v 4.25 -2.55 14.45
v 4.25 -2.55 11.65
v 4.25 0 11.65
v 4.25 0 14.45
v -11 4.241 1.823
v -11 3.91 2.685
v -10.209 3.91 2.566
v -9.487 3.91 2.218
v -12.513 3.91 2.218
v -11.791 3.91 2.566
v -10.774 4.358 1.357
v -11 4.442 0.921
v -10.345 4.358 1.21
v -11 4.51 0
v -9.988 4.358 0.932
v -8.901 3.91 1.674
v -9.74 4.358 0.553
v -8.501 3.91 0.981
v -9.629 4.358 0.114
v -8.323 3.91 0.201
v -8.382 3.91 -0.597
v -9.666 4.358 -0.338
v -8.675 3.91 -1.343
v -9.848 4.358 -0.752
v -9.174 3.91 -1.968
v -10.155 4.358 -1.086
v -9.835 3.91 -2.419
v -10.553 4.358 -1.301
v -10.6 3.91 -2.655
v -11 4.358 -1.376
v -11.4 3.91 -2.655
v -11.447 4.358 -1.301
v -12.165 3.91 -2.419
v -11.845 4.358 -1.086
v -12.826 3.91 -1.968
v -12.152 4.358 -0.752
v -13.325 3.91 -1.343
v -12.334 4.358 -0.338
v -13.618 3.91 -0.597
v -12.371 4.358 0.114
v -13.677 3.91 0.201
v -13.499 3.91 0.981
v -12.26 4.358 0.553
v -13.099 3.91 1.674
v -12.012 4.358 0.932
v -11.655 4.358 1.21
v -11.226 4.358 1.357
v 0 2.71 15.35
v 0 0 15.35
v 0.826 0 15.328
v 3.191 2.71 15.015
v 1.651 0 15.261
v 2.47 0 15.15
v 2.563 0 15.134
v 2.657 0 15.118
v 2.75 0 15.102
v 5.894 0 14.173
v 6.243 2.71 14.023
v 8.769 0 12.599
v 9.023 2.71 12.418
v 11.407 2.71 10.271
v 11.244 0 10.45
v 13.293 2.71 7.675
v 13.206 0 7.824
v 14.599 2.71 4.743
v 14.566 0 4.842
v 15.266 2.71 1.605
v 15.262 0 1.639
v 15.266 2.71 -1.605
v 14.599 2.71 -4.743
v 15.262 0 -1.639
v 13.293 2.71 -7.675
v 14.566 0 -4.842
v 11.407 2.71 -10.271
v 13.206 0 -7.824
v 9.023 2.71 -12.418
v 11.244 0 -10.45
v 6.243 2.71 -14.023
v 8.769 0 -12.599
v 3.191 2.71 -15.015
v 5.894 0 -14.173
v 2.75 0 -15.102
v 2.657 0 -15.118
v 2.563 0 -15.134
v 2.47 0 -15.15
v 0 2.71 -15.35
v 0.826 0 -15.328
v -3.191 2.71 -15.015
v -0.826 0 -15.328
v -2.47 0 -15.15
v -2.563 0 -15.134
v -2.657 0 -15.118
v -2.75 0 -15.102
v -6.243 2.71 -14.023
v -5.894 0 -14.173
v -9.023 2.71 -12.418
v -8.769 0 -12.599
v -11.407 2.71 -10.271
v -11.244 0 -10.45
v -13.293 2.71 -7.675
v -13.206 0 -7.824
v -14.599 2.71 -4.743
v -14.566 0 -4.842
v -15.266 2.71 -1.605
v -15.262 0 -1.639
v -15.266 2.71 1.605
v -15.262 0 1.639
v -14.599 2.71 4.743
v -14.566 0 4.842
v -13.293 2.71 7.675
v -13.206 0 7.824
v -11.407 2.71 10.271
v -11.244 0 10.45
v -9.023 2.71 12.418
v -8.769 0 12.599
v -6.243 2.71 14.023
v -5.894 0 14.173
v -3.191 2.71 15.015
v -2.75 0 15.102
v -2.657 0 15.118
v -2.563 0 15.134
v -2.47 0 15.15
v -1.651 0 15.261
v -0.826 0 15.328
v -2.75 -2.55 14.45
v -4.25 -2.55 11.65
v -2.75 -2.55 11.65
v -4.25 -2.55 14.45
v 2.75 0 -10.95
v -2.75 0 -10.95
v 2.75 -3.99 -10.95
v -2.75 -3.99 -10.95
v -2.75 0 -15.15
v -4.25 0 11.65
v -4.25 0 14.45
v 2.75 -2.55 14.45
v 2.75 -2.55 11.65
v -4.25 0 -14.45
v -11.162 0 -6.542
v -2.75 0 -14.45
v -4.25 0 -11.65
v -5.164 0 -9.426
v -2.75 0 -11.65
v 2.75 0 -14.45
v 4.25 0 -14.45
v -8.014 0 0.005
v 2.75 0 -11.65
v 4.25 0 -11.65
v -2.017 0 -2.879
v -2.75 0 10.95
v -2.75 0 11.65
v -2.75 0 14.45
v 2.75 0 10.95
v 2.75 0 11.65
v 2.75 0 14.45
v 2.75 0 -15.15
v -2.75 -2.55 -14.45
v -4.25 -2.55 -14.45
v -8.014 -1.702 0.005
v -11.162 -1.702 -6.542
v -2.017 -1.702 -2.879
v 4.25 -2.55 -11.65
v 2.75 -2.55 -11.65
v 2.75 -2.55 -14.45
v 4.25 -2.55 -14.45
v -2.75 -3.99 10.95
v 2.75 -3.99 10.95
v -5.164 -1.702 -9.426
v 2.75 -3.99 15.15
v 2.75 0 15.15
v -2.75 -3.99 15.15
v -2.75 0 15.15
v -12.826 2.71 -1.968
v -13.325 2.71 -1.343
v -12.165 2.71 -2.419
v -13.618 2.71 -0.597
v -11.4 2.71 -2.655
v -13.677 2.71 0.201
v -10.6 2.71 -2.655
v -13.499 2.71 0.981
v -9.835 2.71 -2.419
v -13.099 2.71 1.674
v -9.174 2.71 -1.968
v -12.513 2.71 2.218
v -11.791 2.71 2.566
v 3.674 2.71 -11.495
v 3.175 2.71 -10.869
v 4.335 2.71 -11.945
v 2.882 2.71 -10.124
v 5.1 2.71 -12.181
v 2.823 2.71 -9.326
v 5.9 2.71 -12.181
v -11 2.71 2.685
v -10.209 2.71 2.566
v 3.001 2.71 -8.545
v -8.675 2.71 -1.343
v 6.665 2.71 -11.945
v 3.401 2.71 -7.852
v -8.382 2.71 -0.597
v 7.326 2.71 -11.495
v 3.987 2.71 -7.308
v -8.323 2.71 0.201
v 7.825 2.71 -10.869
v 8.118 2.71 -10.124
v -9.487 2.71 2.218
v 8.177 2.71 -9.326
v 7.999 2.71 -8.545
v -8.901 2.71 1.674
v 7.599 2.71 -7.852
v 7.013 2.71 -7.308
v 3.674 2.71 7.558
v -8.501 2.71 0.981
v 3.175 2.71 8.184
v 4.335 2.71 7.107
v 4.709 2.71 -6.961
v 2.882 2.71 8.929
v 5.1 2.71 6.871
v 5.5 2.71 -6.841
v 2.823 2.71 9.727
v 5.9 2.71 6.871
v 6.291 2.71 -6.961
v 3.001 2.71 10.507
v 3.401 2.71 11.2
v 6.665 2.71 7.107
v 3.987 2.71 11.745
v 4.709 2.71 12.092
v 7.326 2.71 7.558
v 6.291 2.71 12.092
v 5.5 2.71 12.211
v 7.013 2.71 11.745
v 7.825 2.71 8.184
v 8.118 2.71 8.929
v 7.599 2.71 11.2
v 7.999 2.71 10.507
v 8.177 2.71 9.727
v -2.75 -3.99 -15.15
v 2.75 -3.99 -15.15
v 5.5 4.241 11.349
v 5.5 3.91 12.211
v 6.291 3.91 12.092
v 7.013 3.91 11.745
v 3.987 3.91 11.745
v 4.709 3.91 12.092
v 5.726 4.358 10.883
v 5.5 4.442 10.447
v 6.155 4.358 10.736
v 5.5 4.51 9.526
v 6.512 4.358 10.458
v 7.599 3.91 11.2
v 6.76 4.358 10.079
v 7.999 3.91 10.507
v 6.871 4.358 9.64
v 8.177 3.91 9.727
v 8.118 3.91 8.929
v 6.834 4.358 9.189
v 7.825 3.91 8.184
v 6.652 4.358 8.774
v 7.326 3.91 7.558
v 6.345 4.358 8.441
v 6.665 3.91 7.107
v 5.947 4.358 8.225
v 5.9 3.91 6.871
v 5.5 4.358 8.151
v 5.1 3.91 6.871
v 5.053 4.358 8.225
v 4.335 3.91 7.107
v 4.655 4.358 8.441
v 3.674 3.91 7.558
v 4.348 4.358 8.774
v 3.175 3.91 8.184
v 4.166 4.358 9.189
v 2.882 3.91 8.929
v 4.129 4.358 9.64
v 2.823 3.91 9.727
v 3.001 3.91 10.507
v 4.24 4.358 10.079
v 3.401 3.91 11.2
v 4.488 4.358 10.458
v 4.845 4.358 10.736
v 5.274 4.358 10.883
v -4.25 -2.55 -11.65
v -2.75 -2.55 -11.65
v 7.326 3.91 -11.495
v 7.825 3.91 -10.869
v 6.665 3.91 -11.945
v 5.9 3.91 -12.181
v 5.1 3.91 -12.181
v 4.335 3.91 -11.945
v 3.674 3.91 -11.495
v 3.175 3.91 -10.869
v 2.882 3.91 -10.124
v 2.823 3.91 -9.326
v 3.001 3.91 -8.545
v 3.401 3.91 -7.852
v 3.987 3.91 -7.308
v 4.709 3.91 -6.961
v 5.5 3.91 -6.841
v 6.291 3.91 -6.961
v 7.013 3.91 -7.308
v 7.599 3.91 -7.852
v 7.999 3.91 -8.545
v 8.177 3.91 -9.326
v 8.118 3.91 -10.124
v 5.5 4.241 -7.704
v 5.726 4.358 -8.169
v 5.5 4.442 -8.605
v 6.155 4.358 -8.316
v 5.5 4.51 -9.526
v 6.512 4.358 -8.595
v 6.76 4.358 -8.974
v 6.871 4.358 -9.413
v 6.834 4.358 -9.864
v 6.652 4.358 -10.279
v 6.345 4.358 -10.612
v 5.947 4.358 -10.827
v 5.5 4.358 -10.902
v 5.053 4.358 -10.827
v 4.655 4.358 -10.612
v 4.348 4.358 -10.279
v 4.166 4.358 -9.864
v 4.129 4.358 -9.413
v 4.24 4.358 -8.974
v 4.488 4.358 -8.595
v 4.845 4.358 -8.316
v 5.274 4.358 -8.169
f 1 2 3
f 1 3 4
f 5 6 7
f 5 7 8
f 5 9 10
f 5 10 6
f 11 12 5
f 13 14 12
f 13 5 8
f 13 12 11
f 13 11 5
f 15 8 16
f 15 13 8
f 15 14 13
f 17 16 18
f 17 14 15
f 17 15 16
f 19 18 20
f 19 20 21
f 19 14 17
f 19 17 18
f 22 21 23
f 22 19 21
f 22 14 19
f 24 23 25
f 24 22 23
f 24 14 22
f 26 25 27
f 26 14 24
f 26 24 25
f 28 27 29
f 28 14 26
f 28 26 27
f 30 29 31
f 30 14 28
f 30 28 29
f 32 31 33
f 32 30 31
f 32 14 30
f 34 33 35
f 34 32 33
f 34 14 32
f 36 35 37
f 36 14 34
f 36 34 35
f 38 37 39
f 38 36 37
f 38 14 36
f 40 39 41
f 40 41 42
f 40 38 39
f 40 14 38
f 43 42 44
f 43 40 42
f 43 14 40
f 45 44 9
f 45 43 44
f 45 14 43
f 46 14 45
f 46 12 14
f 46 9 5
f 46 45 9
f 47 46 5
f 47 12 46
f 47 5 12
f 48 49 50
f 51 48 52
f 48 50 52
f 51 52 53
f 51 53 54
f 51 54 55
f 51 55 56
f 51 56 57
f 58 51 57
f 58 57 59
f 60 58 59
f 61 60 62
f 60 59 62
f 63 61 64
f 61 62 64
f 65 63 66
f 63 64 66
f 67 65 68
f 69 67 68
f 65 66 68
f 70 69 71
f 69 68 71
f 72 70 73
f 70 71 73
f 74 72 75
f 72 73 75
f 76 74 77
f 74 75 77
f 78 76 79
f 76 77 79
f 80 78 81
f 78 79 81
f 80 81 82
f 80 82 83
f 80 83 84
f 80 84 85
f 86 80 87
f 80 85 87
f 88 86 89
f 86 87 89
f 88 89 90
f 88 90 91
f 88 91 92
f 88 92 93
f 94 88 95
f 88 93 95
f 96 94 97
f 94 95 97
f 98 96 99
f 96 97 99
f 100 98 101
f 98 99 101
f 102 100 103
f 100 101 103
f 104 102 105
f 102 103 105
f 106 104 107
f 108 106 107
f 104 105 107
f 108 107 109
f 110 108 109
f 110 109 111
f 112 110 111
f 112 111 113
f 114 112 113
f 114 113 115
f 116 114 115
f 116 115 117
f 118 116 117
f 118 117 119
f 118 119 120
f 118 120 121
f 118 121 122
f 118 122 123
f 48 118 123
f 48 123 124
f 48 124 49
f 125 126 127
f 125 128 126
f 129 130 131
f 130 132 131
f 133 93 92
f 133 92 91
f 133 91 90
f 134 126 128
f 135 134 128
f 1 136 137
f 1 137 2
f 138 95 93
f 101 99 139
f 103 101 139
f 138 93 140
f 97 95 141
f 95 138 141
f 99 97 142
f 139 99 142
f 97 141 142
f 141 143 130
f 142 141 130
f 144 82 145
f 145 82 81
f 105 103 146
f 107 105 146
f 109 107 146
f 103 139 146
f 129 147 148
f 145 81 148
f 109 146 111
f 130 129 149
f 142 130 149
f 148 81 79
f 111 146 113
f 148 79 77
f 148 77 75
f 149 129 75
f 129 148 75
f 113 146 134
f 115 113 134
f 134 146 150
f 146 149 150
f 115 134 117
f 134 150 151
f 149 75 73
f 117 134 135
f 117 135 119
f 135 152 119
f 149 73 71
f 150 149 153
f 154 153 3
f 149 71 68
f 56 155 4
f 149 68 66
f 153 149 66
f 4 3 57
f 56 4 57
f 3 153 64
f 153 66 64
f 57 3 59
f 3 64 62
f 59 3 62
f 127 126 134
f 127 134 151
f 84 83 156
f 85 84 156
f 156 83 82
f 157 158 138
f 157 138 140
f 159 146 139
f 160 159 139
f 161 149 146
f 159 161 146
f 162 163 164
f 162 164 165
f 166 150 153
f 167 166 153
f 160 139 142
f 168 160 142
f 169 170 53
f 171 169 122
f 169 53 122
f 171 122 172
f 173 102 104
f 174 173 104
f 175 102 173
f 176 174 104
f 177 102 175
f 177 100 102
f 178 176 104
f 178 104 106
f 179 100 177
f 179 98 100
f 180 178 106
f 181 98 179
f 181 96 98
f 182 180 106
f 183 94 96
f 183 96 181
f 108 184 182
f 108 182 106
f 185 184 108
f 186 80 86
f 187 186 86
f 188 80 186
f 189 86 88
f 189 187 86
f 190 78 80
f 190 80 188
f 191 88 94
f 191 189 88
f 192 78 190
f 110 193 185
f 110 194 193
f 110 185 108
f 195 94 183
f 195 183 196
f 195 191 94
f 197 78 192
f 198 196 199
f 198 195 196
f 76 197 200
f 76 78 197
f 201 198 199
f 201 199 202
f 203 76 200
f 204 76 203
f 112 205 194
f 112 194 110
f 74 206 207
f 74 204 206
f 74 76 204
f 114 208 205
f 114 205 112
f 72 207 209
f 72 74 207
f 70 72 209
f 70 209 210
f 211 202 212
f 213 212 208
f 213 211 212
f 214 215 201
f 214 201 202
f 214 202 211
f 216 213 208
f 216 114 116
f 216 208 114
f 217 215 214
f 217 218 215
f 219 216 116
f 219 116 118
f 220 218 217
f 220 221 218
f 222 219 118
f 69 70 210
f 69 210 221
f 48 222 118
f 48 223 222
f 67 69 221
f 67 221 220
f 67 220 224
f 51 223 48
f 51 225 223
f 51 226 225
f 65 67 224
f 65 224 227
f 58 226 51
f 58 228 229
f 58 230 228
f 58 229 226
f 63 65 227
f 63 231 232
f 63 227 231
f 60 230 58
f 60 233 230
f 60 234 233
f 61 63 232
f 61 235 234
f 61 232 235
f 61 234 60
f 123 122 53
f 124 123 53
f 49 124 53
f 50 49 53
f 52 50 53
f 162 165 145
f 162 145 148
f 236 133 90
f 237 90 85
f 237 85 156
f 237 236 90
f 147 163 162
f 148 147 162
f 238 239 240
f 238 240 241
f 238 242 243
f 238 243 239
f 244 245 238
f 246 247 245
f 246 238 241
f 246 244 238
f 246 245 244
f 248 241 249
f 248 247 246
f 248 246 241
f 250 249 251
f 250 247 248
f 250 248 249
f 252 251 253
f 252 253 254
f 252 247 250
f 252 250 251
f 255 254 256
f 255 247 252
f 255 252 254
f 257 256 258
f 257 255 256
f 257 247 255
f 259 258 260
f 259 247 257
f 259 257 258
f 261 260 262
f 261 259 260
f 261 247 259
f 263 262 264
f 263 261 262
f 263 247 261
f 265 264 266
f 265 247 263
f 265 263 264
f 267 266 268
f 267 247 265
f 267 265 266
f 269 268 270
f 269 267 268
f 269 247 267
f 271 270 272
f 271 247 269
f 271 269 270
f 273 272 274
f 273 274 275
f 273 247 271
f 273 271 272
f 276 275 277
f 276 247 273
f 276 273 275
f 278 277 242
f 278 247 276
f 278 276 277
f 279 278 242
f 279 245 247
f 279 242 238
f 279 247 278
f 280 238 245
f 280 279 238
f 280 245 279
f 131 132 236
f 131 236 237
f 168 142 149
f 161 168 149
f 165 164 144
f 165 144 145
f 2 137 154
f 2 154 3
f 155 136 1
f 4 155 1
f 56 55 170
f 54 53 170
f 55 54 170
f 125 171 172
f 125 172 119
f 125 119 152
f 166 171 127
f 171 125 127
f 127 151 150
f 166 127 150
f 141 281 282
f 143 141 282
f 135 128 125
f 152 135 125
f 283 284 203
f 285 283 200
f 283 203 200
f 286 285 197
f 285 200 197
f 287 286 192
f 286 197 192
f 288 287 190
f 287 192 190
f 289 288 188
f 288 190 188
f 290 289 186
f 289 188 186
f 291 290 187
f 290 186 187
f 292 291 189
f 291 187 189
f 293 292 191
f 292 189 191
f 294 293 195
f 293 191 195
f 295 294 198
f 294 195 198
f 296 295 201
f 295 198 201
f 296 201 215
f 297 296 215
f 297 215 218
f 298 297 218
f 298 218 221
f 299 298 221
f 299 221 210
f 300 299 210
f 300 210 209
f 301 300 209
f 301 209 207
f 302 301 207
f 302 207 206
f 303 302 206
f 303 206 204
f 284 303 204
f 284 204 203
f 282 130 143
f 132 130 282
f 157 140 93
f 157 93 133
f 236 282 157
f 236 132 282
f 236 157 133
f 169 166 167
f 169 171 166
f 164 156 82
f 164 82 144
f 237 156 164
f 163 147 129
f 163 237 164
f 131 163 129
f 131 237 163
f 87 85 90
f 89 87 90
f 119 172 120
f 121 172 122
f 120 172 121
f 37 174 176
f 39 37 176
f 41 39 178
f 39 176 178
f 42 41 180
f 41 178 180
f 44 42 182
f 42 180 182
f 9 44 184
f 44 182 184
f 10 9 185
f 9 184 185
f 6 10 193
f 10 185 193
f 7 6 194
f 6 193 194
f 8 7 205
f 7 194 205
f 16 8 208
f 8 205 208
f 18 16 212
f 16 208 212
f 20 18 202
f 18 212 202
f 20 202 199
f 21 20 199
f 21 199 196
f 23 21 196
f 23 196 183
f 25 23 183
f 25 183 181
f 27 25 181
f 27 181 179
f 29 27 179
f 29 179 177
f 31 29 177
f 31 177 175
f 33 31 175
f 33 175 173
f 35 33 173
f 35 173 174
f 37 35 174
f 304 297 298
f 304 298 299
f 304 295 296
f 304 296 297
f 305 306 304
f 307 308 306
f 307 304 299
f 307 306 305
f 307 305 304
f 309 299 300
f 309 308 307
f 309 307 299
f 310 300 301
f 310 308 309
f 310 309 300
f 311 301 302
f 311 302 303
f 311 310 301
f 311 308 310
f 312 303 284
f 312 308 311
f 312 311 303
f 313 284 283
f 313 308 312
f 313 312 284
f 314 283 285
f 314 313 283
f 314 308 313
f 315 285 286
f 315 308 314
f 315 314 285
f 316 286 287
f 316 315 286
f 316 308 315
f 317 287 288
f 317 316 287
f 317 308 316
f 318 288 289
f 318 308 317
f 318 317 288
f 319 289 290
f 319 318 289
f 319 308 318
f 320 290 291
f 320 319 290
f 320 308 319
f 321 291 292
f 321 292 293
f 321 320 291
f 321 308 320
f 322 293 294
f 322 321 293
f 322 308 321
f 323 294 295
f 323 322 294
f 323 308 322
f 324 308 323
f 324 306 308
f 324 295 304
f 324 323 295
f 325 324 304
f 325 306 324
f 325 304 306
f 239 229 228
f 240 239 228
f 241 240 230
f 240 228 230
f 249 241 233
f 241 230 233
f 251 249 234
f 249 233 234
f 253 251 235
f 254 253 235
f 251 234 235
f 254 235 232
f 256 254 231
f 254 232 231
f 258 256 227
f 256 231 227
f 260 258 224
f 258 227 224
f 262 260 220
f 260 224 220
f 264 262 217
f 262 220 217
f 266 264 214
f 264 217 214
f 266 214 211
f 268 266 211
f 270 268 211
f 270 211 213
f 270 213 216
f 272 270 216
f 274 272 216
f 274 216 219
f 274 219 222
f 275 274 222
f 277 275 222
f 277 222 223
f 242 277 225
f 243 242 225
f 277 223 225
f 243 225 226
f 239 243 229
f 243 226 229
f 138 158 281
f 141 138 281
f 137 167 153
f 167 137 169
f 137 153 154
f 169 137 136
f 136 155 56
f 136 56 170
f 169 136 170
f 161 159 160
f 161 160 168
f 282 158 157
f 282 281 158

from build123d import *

# Parameters (mm, degrees)
SKETCH1_R                      = 15.35
BOSS_EXTRUDE1_DEPTH            = 2.71
SKETCH2_R                      = 2.685
BOSS_EXTRUDE2_DEPTH            = 1.2
DOME1_FACE_RADIUS              = 2.685
DOME1_HEIGHT                   = 0.6
CIRPATTERN1_COUNT              = 3
CIRPATTERN1_COPY_1_FACE_RADIUS = 2.685
CIRPATTERN1_COPY_1_HEIGHT      = 0.6
CIRPATTERN1_COPY_2_FACE_RADIUS = 2.685
CIRPATTERN1_COPY_2_HEIGHT      = 0.6
BOSS_EXTRUDE3_START            = 2.55
SKETCH3_W                      = 5.5
SKETCH3_H                      = 4.2
SKETCH3_W_2                    = 1.5
SKETCH3_H_2                    = 2.8
BOSS_EXTRUDE3_DEPTH            = 2.55
SKETCH4_W                      = 5.5
SKETCH4_H                      = 4.2
BOSS_EXTRUDE4_DEPTH            = 1.44
CHIP_DEPTH                     = 1.7018


with BuildPart() as part:
    # Sketch1 → Boss-Extrude1 (new body)
    with BuildSketch(Plane(origin=(0, 0, 0), x_dir=(1, 0, 0), z_dir=(0, 1, 0))):
        with Locations(Location((0, 0, 0), (0, 0, 270))):
            Circle(SKETCH1_R)
    extrude(amount=BOSS_EXTRUDE1_DEPTH)

    # Sketch2 → Boss-Extrude2 (add)
    with BuildSketch(Plane(origin=(0, 2.71, 0), x_dir=(-1, 0, 0), z_dir=(0, 1, 0))):
        with Locations(Location((-5.5, 9.526279442, 0), (0, 0, 90))):
            Circle(SKETCH2_R)
    boss_extrude2 = extrude(amount=BOSS_EXTRUDE2_DEPTH)

    # Dome1: a dome of height H over a round flat face of radius A is a cap of a sphere of radius (A * A + H * H) / (2 * H)
    dome1_r = (DOME1_FACE_RADIUS * DOME1_FACE_RADIUS + DOME1_HEIGHT * DOME1_HEIGHT) / (2 * DOME1_HEIGHT)
    dome1_base = Plane((5.5, 3.91, 9.526279442), z_dir=(0, 1, 0))
    with Locations(dome1_base.offset(DOME1_HEIGHT - dome1_r)):
        dome1_ball = Sphere(dome1_r, mode=Mode.PRIVATE)
    add(split(dome1_ball, bisect_by=dome1_base, keep=Keep.TOP, mode=Mode.PRIVATE))

    # CirPattern1: Boss-Extrude2 ×3 about axis
    cirpattern1_axis = Axis((0, 0, 0), (0, 1, 0))
    for i in range(1, CIRPATTERN1_COUNT):
        add(boss_extrude2.rotate(cirpattern1_axis, i * 360 / CIRPATTERN1_COUNT))

    # CirPattern1 copy 1: a dome of height H over a round flat face of radius A is a cap of a sphere of radius (A * A + H * H) / (2 * H)
    cirpattern1_copy_1_r = (CIRPATTERN1_COPY_1_FACE_RADIUS * CIRPATTERN1_COPY_1_FACE_RADIUS + CIRPATTERN1_COPY_1_HEIGHT * CIRPATTERN1_COPY_1_HEIGHT) / (2 * CIRPATTERN1_COPY_1_HEIGHT)
    cirpattern1_copy_1_base = Plane((5.5, 3.91, -9.526279442), z_dir=(0, 1, 0))
    with Locations(cirpattern1_copy_1_base.offset(CIRPATTERN1_COPY_1_HEIGHT - cirpattern1_copy_1_r)):
        cirpattern1_copy_1_ball = Sphere(cirpattern1_copy_1_r, mode=Mode.PRIVATE)
    add(split(cirpattern1_copy_1_ball, bisect_by=cirpattern1_copy_1_base, keep=Keep.TOP, mode=Mode.PRIVATE))

    # CirPattern1 copy 2: a dome of height H over a round flat face of radius A is a cap of a sphere of radius (A * A + H * H) / (2 * H)
    cirpattern1_copy_2_r = (CIRPATTERN1_COPY_2_FACE_RADIUS * CIRPATTERN1_COPY_2_FACE_RADIUS + CIRPATTERN1_COPY_2_HEIGHT * CIRPATTERN1_COPY_2_HEIGHT) / (2 * CIRPATTERN1_COPY_2_HEIGHT)
    cirpattern1_copy_2_base = Plane((-11, 3.91, 0), z_dir=(0, 1, 0))
    with Locations(cirpattern1_copy_2_base.offset(CIRPATTERN1_COPY_2_HEIGHT - cirpattern1_copy_2_r)):
        cirpattern1_copy_2_ball = Sphere(cirpattern1_copy_2_r, mode=Mode.PRIVATE)
    add(split(cirpattern1_copy_2_ball, bisect_by=cirpattern1_copy_2_base, keep=Keep.TOP, mode=Mode.PRIVATE))

    # Sketch3 → Boss-Extrude3 (add)
    with BuildSketch(Plane.XZ.offset(BOSS_EXTRUDE3_START)):
        with Locations((0, 13.05)):
            Rectangle(SKETCH3_W, SKETCH3_H)
        with Locations((0, -13.05)):
            Rectangle(SKETCH3_W, SKETCH3_H)
        with Locations((3.5, 13.05)):
            Rectangle(SKETCH3_W_2, SKETCH3_H_2)
        with Locations((-3.5, 13.05)):
            Rectangle(SKETCH3_W_2, SKETCH3_H_2)
        with Locations((3.5, -13.05)):
            Rectangle(SKETCH3_W_2, SKETCH3_H_2)
        with Locations((-3.5, -13.05)):
            Rectangle(SKETCH3_W_2, SKETCH3_H_2)
        with BuildLine():
            Line((2.75, 15.101655538), (2.75, 15.15))
            Line((2.75, 15.15), (2.469817807, 15.15))
            ThreePointArc((2.469817807, 15.15), (2.610020839, 15.126476497), (2.75, 15.101655538))
        make_face()
        with BuildLine():
            ThreePointArc((-2.75, 15.101655538), (-2.610020839, 15.126476497), (-2.469817807, 15.15))
            Line((-2.469817807, 15.15), (-2.75, 15.15))
            Line((-2.75, 15.15), (-2.75, 15.101655538))
        make_face()
        with BuildLine():
            ThreePointArc((-2.469817807, -15.15), (-2.610020839, -15.126476497), (-2.75, -15.101655538))
            Line((-2.75, -15.101655538), (-2.75, -15.15))
            Line((-2.75, -15.15), (-2.469817807, -15.15))
        make_face()
        with BuildLine():
            Line((2.75, -15.15), (2.75, -15.101655538))
            ThreePointArc((2.75, -15.101655538), (2.610020839, -15.126476497), (2.469817807, -15.15))
            Line((2.469817807, -15.15), (2.75, -15.15))
        make_face()
    extrude(amount=-BOSS_EXTRUDE3_DEPTH)

    # Sketch4 → Boss-Extrude4 (add)
    with BuildSketch(Plane.XZ.offset(2.55)):
        Polygon((-2.75, 10.95), (2.75, 10.95), (2.75, 11.65), (2.75, 14.45), (2.75, 15.15), (-2.75, 15.15), (-2.75, 14.45), (-2.75, 11.65), align=None)
        with Locations((0, -13.05)):
            Rectangle(SKETCH4_W, SKETCH4_H)
    extrude(amount=BOSS_EXTRUDE4_DEPTH)

    # Sketch5 → Chip (add)
    with BuildSketch(Plane.XZ):
        Polygon((-5.1644, -9.425953844), (-2.016601499, -2.878979584), (-8.014179317, 0.004667994), (-11.161977818, -6.542306266), align=None)
    extrude(amount=CHIP_DEPTH)


solid = part.part
